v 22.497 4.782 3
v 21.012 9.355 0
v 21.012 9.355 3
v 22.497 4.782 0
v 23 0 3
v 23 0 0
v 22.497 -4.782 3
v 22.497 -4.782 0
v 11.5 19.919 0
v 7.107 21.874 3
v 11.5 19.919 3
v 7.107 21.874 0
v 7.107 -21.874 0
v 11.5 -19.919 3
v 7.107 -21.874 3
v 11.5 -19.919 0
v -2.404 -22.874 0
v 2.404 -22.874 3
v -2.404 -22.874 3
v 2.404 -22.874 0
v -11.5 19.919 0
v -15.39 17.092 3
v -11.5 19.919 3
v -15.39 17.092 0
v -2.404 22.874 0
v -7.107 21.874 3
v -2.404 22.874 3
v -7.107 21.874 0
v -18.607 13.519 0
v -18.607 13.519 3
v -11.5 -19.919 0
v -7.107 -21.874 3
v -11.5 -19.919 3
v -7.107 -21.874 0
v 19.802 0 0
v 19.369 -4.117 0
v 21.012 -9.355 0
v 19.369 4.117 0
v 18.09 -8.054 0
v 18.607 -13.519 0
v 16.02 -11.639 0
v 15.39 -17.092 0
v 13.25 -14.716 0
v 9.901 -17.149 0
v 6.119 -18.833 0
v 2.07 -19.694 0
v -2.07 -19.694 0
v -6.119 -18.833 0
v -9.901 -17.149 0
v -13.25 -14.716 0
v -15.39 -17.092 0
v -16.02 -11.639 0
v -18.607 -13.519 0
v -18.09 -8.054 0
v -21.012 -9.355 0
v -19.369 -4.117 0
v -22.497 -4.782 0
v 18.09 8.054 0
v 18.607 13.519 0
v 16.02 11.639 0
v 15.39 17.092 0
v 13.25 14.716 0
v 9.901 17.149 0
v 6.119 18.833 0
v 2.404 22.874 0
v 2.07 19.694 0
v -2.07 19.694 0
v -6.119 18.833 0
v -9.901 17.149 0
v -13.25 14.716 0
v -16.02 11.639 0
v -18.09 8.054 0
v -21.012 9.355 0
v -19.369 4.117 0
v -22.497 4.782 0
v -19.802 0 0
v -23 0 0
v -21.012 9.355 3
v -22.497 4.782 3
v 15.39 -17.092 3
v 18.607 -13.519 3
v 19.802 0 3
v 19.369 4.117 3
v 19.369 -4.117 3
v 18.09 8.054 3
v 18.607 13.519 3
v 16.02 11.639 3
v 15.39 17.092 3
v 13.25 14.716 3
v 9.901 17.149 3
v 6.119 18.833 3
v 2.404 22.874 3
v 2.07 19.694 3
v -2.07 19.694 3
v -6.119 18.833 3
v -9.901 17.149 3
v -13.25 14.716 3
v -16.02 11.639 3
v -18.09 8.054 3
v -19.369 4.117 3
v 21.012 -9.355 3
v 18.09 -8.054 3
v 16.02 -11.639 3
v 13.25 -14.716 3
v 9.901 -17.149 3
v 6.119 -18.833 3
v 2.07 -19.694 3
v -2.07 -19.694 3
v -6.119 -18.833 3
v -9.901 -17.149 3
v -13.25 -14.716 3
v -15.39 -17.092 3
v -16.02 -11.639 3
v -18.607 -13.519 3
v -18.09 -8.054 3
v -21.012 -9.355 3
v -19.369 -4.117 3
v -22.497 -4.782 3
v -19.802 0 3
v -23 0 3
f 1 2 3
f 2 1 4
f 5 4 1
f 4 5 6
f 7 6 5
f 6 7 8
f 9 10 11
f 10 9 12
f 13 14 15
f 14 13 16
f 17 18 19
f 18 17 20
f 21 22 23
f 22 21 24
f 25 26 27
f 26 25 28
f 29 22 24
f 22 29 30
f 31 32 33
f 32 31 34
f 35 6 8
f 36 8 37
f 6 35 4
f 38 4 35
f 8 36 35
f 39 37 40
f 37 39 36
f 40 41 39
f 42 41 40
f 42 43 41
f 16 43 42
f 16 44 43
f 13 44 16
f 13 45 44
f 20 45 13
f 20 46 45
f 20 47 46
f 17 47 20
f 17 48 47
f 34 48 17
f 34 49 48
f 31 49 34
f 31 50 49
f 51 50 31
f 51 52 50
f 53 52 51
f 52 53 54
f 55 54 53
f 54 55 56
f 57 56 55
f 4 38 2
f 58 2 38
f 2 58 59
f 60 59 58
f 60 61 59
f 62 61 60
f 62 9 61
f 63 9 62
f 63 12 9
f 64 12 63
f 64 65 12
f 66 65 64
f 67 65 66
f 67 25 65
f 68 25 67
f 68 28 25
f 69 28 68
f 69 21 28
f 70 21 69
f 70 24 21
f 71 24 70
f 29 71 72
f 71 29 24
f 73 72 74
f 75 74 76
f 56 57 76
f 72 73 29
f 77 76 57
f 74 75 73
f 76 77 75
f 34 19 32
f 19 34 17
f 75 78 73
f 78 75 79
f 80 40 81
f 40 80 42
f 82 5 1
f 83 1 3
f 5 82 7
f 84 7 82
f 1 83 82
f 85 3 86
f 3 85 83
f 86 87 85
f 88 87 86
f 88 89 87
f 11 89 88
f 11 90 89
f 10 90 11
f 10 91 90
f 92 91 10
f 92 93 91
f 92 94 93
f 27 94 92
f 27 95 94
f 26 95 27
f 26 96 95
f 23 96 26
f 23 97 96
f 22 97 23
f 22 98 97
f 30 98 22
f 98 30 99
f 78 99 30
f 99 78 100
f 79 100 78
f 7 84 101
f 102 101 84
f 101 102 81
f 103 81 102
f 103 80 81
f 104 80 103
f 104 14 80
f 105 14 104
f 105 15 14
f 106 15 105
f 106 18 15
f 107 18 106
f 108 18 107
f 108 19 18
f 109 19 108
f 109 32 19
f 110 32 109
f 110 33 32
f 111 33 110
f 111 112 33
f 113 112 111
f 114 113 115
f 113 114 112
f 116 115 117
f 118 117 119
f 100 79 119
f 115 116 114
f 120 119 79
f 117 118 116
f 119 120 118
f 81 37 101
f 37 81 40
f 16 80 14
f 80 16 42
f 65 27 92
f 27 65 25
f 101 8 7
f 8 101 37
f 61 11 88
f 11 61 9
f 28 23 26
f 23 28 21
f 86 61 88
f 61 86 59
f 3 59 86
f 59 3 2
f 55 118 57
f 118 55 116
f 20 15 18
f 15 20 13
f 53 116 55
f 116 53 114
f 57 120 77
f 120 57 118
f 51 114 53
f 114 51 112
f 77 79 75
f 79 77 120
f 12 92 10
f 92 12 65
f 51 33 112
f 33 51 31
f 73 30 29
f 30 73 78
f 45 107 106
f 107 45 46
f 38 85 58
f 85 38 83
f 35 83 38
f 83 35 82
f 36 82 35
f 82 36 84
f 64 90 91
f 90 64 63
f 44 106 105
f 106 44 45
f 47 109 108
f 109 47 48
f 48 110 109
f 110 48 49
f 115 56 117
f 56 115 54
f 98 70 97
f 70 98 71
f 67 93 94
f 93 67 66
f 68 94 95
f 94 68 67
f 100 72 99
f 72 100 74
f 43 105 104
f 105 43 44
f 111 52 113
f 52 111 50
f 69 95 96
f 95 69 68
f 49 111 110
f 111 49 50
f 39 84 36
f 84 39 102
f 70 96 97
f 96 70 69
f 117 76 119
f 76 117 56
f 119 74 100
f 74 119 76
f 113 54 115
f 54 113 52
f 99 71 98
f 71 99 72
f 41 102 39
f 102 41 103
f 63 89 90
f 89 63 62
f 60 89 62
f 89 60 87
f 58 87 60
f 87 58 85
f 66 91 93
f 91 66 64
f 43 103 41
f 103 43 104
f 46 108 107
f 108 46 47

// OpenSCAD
//Remixed by Shea Silverman - http://blog.sheasilverman.com
//keychain-Customizable Lithopane by Mark G. Peeters 
//http://www.thingiverse.com/thing:308109
//version 1.3 
//if you are using openSCAD then you are cool! You can get DAT files for local use using this tool
//http://customizer.makerbot.com/image_surface
// i used the nice code for adjusting layers from here:
//http://www.thingiverse.com/thing:74322

// preview[view:south, tilt:top]
//
//
/* [Image] */

// Load a 100x100 pixel image.(images will be stretched to fit) Simple photos work best. Don't forget to click the Invert Colors checkbox! *** ALSO IF YOU HAVE LETTERS IN YOUR IMAGE make sure to reverse the image before uploading so the letters are not backwards.
image_file = "image-surface.dat"; // [image_surface:100x100]

/* [Adjustments] */

//shape NOTE: ALL units are in millimeters (mm)
shape = 0;//[0:circle, 1:square]
//over all size of the keychain. you picked
tag_size = 40;// [20:70]

// What layer height will you slice this at?  The thinner the better.
layer_height = 0.1;
//Use plastic color opacity to set this. The lower the layer height, the more layers you can use. you picked
number_of_layers = 12; // [5:30]
//Width of border lining the keychain (3mm is fine)
border_width = 3;//
//border thickness lining the keychain (at least 3mm for strength)
border_thick = 3;//

/* [Hidden] */

// base (white) will always be 2 layers thick
min_layer_height = layer_height*2;
height = layer_height*number_of_layers;
maxheight = height+min_layer_height;


// Make litho and trim bottom and sides
  difference() { //diff 1
  translate([0, 0, min_layer_height]) scale([(tag_size/100),(tag_size/100),height]) surface(file=image_file, center=true, convexity=5); //litosurface moved up min_layer_height
  translate([0,0,-(maxheight)]) linear_extrude(height=maxheight) square(tag_size, center=true);//cutting bottom off surface

if (shape==0) {//you picked circle shape------------------------------------
difference() {  //diff make tube to trim lith
                translate([0, 0, -7]) cylinder(maxheight+15,r= tag_size); //outside
                translate([0, 0, -9]) cylinder(maxheight+18,r= (tag_size/2)); //inside
               } //end diff make tube
                //translate([0, tag_size/2+border_width, -1])cylinder(maxheight+2,r= ring_hole/2); //ring hole
}//end if you picked circle------------------------------------------



}//end diff 1

//add border and loop
if (shape==0) {//you picked circle shape--------------------------
//translate([0, tag_size/2+border_width, 0]) //move loop

//difference(){//make loop
//cylinder(border_thick,r=border_width+ring_hole/2); //ring support
//translate([0, 0, -1])cylinder(border_thick+2,r= ring_hole/2); //ring hole
//}

difference() {  //diff make frame tube
                 cylinder(border_thick,r= (tag_size/2)+border_width); //outside
                 cylinder(border_thick+1,r= (tag_size/2.02)); //inside
//translate([0, tag_size/2+border_width, -1])cylinder(border_thick+2,r= ring_hole/2); //ring hole
                } //end diff make frame tube

}//end if you picked circle------------------------------------------

if (shape==1) {//you picked square shape------------------------------------
translate([tag_size/2, tag_size/2, 0]) //move loop
difference(){//make loop
cylinder(border_thick,r=border_width+ring_hole/2); //ring support
translate([0, 0, -1])cylinder(border_thick+2,r= ring_hole/2); //ring hole
}

difference() {  //diff make frame tube
                 translate([0,0,border_thick/2]) cube([tag_size+border_width*2,tag_size+border_width*2,border_thick],center=true); //outside
                 translate([0,0,border_thick/2]) cube([tag_size-1,tag_size-1,border_thick+1],center=true); //inside
translate([tag_size/2, tag_size/2, -1])cylinder(border_thick+2,r= ring_hole/2); //ring hole                
                        } //end diff make frame tube
}//end if you picked square------------------------------------------------





